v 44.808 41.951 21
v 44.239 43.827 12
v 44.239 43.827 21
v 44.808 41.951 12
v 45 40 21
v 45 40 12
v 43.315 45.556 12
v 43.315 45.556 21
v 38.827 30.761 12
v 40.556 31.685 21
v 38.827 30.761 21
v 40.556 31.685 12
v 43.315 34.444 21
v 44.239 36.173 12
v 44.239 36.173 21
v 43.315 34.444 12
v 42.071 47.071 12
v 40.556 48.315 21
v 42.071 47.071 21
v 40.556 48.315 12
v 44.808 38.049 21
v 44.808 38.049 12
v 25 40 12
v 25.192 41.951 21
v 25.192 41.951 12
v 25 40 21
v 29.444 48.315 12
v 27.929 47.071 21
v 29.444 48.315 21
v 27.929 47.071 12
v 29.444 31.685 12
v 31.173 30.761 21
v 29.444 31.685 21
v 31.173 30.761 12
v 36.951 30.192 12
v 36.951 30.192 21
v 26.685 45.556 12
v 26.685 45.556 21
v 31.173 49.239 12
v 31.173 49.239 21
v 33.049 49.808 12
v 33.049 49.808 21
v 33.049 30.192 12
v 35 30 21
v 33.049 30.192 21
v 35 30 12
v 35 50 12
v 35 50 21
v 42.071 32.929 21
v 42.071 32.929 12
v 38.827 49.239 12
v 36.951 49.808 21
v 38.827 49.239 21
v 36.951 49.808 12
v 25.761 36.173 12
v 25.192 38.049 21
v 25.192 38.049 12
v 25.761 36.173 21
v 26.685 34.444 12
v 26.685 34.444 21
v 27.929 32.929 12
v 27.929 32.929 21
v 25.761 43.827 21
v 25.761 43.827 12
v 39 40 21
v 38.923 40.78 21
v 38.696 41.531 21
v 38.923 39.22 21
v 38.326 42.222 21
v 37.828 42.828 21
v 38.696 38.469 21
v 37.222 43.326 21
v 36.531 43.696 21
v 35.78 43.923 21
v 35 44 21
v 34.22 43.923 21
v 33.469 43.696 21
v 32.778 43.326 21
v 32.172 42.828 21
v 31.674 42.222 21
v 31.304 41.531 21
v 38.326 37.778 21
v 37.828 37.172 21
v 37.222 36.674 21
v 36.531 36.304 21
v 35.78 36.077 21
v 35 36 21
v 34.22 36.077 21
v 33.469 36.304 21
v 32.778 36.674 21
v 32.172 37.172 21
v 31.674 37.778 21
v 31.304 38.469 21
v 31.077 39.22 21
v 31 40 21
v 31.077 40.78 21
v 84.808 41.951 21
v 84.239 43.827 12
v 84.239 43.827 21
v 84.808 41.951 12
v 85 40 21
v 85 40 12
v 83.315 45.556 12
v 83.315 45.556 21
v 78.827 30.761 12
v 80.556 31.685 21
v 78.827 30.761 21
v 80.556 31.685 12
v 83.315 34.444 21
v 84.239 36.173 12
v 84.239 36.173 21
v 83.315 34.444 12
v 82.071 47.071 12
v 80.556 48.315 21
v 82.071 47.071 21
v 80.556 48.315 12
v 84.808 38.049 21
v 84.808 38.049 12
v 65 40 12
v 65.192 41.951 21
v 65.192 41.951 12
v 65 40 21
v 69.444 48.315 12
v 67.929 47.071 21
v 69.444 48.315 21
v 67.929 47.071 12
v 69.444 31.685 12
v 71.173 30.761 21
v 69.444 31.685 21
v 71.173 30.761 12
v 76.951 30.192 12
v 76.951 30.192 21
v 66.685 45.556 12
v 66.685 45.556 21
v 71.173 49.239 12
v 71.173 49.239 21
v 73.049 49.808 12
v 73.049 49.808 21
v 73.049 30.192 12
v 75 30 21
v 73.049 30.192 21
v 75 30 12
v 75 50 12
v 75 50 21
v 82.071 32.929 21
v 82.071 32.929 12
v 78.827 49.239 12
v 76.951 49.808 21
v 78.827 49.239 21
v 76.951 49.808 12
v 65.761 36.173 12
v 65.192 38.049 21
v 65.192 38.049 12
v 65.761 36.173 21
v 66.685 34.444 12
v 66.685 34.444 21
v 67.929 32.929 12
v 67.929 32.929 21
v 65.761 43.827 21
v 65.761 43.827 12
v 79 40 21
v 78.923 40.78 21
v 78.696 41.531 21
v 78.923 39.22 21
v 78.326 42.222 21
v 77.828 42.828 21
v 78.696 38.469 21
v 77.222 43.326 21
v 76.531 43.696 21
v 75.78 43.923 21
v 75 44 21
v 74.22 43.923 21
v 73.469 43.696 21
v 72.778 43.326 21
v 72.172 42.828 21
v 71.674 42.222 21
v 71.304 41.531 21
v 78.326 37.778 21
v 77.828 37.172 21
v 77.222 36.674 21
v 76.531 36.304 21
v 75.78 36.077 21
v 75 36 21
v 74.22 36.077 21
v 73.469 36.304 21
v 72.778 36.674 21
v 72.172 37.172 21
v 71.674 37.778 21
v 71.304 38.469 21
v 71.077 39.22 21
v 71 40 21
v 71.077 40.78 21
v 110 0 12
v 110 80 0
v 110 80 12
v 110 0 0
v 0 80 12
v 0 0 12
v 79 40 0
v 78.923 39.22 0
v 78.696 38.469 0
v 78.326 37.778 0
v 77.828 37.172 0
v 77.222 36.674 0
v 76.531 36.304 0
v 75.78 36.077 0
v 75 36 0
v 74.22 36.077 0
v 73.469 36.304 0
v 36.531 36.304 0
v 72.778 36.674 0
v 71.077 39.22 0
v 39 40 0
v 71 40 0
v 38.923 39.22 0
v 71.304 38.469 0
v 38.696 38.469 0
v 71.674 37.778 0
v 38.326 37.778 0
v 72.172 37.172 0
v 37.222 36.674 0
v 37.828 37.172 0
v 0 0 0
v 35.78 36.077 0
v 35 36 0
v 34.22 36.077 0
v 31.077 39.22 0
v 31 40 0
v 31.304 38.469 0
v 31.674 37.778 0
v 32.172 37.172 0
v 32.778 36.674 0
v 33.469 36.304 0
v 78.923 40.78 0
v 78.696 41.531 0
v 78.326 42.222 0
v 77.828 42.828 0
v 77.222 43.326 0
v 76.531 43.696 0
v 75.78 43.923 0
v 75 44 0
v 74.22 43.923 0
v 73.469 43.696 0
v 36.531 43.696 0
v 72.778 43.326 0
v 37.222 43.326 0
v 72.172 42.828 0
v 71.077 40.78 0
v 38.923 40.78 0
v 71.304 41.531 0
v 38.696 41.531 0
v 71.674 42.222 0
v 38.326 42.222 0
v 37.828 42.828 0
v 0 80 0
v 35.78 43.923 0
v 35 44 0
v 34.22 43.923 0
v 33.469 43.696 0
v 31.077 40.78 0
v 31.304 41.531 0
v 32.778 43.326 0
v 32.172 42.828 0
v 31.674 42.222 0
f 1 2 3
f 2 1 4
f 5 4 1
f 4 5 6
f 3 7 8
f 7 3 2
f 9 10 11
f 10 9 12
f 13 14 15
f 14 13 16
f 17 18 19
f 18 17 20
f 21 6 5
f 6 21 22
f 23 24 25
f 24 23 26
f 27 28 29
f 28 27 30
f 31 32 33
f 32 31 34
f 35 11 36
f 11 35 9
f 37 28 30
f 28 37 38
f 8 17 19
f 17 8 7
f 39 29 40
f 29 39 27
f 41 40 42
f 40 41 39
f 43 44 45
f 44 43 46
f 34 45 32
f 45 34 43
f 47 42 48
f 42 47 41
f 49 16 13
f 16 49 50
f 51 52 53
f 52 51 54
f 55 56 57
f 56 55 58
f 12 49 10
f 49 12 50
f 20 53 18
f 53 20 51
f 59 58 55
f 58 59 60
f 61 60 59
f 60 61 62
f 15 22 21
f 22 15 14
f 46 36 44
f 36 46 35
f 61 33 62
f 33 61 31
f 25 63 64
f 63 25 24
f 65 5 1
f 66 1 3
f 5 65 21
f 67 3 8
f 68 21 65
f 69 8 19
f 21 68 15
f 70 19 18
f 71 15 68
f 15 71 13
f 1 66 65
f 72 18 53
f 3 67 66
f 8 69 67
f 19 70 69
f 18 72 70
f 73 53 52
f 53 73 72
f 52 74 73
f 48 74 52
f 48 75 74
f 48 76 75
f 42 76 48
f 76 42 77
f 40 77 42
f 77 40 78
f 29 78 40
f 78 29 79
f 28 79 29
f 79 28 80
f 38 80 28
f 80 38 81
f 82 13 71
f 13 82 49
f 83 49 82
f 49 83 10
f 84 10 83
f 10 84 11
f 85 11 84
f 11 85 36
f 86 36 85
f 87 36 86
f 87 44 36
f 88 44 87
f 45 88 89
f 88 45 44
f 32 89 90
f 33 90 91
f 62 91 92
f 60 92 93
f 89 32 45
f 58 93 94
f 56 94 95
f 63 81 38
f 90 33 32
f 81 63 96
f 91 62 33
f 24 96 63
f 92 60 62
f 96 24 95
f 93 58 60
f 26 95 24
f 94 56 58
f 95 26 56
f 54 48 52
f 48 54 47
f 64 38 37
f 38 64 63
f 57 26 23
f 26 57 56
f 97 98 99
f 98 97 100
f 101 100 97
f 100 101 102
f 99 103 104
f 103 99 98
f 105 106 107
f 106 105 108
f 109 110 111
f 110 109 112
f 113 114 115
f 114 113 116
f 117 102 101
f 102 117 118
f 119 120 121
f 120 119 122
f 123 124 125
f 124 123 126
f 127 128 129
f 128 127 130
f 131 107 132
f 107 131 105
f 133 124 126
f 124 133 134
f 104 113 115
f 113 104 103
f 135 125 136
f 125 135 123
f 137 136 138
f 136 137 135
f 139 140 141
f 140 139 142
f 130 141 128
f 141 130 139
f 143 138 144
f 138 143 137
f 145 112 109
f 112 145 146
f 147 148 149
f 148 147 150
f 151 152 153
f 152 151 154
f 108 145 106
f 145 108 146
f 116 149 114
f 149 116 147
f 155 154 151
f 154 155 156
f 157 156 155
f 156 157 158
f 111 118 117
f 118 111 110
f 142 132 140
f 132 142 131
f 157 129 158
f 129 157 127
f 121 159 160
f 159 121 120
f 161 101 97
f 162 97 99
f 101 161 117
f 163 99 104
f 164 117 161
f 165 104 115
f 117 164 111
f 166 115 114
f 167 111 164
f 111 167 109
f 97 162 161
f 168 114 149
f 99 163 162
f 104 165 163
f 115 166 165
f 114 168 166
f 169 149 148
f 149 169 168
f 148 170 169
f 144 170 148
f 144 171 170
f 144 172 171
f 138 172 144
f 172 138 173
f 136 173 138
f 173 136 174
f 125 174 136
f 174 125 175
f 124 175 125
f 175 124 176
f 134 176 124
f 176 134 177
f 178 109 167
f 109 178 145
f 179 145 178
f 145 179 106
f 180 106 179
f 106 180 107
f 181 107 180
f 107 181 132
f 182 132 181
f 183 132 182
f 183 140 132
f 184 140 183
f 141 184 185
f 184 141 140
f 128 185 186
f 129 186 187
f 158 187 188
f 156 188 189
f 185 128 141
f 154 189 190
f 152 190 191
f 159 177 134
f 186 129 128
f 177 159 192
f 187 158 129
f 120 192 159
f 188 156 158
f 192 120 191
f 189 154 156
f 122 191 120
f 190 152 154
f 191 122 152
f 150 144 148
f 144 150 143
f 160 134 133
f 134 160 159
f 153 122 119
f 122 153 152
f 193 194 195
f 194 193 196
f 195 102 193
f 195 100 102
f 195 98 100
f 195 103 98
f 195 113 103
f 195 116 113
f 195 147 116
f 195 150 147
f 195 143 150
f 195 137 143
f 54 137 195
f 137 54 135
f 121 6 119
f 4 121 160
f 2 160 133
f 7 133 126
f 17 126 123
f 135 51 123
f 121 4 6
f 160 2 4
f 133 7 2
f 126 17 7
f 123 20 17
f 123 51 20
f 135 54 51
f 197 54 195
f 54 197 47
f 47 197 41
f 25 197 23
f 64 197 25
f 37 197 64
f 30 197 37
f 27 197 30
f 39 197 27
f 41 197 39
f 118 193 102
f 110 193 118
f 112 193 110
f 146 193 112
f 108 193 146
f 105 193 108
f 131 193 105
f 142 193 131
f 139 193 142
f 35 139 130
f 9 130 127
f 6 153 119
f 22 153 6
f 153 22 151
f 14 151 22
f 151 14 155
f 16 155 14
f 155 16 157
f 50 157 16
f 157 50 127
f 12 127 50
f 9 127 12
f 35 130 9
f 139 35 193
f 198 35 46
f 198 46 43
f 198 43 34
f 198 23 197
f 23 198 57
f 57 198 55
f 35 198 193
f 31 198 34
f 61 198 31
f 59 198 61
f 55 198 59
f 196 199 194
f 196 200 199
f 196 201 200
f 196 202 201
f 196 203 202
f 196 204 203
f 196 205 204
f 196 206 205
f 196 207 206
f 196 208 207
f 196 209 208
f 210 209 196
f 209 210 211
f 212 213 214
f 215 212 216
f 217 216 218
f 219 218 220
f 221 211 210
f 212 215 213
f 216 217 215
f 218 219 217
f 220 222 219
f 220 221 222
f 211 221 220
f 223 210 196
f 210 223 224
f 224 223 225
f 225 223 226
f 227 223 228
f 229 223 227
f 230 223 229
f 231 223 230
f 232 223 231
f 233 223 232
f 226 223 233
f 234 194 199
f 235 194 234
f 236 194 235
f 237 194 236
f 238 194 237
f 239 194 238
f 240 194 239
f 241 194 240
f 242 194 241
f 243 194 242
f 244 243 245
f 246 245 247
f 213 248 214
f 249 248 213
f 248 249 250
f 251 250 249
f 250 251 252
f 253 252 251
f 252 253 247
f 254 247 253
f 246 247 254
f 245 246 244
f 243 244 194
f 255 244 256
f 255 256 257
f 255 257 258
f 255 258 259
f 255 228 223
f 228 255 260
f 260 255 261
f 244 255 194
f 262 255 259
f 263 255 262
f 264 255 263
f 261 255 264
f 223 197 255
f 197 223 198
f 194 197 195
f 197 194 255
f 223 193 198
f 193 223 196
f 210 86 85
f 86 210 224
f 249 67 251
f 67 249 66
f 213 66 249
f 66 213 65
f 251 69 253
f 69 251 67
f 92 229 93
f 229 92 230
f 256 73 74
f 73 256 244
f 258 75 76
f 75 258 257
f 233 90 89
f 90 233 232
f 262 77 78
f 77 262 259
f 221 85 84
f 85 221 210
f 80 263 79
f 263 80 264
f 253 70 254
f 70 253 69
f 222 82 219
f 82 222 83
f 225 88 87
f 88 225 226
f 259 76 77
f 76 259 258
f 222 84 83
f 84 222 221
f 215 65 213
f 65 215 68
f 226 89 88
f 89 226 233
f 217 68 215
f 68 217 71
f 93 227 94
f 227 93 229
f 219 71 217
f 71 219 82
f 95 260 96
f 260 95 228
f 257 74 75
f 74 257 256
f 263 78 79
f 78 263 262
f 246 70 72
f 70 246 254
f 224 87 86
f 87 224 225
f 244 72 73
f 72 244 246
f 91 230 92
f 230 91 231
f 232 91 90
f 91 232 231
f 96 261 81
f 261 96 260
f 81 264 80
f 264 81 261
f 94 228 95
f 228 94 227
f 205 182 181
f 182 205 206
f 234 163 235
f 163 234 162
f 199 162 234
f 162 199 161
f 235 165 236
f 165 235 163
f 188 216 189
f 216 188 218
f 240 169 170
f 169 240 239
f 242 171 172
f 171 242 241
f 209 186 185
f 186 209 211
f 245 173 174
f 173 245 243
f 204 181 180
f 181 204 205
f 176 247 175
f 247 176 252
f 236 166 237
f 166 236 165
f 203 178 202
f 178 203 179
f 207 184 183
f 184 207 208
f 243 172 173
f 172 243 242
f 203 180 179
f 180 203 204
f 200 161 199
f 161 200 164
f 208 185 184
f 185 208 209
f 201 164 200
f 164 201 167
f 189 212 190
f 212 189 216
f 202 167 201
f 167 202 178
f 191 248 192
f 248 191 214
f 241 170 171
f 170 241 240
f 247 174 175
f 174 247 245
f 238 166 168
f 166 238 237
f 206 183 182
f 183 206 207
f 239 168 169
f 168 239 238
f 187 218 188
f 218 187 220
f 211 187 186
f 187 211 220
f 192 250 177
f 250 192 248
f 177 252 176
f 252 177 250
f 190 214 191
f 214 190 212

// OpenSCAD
$fn = 32;

// ----------------------------------------------------------------------
// Drill jig: two_boss jig
// ----------------------------------------------------------------------

// --- parameters (mm) ---
plate_l = 110;            // plate length, X
plate_w = 80;             // plate width, Y
plate_t = 12;             // plate thickness
boss_d = 20;              // guide boss diameter
boss_h = 10;              // boss height above the plate
guide_d = 8;              // guide hole diameter
boss_pitch = 40;          // boss pitch

n_boss = 2;  // guide bosses
boss_x0 = (plate_l - (n_boss - 1) * boss_pitch) / 2;  // first boss X
boss_top = plate_t - 1 + boss_h;  // boss crown height
total_h = boss_top;  // overall height

difference() {
  union() {
  cube([plate_l, plate_w, plate_t]);
  for (i = [0 : n_boss - 1])
    translate([boss_x0 + i * boss_pitch, plate_w / 2, plate_t - 1])
      cylinder(h = boss_h, d = boss_d);
  }
  for (i = [0 : n_boss - 1])
    translate([boss_x0 + i * boss_pitch, plate_w / 2, -1])
      cylinder(h = plate_t + boss_h, d = guide_d);
}
